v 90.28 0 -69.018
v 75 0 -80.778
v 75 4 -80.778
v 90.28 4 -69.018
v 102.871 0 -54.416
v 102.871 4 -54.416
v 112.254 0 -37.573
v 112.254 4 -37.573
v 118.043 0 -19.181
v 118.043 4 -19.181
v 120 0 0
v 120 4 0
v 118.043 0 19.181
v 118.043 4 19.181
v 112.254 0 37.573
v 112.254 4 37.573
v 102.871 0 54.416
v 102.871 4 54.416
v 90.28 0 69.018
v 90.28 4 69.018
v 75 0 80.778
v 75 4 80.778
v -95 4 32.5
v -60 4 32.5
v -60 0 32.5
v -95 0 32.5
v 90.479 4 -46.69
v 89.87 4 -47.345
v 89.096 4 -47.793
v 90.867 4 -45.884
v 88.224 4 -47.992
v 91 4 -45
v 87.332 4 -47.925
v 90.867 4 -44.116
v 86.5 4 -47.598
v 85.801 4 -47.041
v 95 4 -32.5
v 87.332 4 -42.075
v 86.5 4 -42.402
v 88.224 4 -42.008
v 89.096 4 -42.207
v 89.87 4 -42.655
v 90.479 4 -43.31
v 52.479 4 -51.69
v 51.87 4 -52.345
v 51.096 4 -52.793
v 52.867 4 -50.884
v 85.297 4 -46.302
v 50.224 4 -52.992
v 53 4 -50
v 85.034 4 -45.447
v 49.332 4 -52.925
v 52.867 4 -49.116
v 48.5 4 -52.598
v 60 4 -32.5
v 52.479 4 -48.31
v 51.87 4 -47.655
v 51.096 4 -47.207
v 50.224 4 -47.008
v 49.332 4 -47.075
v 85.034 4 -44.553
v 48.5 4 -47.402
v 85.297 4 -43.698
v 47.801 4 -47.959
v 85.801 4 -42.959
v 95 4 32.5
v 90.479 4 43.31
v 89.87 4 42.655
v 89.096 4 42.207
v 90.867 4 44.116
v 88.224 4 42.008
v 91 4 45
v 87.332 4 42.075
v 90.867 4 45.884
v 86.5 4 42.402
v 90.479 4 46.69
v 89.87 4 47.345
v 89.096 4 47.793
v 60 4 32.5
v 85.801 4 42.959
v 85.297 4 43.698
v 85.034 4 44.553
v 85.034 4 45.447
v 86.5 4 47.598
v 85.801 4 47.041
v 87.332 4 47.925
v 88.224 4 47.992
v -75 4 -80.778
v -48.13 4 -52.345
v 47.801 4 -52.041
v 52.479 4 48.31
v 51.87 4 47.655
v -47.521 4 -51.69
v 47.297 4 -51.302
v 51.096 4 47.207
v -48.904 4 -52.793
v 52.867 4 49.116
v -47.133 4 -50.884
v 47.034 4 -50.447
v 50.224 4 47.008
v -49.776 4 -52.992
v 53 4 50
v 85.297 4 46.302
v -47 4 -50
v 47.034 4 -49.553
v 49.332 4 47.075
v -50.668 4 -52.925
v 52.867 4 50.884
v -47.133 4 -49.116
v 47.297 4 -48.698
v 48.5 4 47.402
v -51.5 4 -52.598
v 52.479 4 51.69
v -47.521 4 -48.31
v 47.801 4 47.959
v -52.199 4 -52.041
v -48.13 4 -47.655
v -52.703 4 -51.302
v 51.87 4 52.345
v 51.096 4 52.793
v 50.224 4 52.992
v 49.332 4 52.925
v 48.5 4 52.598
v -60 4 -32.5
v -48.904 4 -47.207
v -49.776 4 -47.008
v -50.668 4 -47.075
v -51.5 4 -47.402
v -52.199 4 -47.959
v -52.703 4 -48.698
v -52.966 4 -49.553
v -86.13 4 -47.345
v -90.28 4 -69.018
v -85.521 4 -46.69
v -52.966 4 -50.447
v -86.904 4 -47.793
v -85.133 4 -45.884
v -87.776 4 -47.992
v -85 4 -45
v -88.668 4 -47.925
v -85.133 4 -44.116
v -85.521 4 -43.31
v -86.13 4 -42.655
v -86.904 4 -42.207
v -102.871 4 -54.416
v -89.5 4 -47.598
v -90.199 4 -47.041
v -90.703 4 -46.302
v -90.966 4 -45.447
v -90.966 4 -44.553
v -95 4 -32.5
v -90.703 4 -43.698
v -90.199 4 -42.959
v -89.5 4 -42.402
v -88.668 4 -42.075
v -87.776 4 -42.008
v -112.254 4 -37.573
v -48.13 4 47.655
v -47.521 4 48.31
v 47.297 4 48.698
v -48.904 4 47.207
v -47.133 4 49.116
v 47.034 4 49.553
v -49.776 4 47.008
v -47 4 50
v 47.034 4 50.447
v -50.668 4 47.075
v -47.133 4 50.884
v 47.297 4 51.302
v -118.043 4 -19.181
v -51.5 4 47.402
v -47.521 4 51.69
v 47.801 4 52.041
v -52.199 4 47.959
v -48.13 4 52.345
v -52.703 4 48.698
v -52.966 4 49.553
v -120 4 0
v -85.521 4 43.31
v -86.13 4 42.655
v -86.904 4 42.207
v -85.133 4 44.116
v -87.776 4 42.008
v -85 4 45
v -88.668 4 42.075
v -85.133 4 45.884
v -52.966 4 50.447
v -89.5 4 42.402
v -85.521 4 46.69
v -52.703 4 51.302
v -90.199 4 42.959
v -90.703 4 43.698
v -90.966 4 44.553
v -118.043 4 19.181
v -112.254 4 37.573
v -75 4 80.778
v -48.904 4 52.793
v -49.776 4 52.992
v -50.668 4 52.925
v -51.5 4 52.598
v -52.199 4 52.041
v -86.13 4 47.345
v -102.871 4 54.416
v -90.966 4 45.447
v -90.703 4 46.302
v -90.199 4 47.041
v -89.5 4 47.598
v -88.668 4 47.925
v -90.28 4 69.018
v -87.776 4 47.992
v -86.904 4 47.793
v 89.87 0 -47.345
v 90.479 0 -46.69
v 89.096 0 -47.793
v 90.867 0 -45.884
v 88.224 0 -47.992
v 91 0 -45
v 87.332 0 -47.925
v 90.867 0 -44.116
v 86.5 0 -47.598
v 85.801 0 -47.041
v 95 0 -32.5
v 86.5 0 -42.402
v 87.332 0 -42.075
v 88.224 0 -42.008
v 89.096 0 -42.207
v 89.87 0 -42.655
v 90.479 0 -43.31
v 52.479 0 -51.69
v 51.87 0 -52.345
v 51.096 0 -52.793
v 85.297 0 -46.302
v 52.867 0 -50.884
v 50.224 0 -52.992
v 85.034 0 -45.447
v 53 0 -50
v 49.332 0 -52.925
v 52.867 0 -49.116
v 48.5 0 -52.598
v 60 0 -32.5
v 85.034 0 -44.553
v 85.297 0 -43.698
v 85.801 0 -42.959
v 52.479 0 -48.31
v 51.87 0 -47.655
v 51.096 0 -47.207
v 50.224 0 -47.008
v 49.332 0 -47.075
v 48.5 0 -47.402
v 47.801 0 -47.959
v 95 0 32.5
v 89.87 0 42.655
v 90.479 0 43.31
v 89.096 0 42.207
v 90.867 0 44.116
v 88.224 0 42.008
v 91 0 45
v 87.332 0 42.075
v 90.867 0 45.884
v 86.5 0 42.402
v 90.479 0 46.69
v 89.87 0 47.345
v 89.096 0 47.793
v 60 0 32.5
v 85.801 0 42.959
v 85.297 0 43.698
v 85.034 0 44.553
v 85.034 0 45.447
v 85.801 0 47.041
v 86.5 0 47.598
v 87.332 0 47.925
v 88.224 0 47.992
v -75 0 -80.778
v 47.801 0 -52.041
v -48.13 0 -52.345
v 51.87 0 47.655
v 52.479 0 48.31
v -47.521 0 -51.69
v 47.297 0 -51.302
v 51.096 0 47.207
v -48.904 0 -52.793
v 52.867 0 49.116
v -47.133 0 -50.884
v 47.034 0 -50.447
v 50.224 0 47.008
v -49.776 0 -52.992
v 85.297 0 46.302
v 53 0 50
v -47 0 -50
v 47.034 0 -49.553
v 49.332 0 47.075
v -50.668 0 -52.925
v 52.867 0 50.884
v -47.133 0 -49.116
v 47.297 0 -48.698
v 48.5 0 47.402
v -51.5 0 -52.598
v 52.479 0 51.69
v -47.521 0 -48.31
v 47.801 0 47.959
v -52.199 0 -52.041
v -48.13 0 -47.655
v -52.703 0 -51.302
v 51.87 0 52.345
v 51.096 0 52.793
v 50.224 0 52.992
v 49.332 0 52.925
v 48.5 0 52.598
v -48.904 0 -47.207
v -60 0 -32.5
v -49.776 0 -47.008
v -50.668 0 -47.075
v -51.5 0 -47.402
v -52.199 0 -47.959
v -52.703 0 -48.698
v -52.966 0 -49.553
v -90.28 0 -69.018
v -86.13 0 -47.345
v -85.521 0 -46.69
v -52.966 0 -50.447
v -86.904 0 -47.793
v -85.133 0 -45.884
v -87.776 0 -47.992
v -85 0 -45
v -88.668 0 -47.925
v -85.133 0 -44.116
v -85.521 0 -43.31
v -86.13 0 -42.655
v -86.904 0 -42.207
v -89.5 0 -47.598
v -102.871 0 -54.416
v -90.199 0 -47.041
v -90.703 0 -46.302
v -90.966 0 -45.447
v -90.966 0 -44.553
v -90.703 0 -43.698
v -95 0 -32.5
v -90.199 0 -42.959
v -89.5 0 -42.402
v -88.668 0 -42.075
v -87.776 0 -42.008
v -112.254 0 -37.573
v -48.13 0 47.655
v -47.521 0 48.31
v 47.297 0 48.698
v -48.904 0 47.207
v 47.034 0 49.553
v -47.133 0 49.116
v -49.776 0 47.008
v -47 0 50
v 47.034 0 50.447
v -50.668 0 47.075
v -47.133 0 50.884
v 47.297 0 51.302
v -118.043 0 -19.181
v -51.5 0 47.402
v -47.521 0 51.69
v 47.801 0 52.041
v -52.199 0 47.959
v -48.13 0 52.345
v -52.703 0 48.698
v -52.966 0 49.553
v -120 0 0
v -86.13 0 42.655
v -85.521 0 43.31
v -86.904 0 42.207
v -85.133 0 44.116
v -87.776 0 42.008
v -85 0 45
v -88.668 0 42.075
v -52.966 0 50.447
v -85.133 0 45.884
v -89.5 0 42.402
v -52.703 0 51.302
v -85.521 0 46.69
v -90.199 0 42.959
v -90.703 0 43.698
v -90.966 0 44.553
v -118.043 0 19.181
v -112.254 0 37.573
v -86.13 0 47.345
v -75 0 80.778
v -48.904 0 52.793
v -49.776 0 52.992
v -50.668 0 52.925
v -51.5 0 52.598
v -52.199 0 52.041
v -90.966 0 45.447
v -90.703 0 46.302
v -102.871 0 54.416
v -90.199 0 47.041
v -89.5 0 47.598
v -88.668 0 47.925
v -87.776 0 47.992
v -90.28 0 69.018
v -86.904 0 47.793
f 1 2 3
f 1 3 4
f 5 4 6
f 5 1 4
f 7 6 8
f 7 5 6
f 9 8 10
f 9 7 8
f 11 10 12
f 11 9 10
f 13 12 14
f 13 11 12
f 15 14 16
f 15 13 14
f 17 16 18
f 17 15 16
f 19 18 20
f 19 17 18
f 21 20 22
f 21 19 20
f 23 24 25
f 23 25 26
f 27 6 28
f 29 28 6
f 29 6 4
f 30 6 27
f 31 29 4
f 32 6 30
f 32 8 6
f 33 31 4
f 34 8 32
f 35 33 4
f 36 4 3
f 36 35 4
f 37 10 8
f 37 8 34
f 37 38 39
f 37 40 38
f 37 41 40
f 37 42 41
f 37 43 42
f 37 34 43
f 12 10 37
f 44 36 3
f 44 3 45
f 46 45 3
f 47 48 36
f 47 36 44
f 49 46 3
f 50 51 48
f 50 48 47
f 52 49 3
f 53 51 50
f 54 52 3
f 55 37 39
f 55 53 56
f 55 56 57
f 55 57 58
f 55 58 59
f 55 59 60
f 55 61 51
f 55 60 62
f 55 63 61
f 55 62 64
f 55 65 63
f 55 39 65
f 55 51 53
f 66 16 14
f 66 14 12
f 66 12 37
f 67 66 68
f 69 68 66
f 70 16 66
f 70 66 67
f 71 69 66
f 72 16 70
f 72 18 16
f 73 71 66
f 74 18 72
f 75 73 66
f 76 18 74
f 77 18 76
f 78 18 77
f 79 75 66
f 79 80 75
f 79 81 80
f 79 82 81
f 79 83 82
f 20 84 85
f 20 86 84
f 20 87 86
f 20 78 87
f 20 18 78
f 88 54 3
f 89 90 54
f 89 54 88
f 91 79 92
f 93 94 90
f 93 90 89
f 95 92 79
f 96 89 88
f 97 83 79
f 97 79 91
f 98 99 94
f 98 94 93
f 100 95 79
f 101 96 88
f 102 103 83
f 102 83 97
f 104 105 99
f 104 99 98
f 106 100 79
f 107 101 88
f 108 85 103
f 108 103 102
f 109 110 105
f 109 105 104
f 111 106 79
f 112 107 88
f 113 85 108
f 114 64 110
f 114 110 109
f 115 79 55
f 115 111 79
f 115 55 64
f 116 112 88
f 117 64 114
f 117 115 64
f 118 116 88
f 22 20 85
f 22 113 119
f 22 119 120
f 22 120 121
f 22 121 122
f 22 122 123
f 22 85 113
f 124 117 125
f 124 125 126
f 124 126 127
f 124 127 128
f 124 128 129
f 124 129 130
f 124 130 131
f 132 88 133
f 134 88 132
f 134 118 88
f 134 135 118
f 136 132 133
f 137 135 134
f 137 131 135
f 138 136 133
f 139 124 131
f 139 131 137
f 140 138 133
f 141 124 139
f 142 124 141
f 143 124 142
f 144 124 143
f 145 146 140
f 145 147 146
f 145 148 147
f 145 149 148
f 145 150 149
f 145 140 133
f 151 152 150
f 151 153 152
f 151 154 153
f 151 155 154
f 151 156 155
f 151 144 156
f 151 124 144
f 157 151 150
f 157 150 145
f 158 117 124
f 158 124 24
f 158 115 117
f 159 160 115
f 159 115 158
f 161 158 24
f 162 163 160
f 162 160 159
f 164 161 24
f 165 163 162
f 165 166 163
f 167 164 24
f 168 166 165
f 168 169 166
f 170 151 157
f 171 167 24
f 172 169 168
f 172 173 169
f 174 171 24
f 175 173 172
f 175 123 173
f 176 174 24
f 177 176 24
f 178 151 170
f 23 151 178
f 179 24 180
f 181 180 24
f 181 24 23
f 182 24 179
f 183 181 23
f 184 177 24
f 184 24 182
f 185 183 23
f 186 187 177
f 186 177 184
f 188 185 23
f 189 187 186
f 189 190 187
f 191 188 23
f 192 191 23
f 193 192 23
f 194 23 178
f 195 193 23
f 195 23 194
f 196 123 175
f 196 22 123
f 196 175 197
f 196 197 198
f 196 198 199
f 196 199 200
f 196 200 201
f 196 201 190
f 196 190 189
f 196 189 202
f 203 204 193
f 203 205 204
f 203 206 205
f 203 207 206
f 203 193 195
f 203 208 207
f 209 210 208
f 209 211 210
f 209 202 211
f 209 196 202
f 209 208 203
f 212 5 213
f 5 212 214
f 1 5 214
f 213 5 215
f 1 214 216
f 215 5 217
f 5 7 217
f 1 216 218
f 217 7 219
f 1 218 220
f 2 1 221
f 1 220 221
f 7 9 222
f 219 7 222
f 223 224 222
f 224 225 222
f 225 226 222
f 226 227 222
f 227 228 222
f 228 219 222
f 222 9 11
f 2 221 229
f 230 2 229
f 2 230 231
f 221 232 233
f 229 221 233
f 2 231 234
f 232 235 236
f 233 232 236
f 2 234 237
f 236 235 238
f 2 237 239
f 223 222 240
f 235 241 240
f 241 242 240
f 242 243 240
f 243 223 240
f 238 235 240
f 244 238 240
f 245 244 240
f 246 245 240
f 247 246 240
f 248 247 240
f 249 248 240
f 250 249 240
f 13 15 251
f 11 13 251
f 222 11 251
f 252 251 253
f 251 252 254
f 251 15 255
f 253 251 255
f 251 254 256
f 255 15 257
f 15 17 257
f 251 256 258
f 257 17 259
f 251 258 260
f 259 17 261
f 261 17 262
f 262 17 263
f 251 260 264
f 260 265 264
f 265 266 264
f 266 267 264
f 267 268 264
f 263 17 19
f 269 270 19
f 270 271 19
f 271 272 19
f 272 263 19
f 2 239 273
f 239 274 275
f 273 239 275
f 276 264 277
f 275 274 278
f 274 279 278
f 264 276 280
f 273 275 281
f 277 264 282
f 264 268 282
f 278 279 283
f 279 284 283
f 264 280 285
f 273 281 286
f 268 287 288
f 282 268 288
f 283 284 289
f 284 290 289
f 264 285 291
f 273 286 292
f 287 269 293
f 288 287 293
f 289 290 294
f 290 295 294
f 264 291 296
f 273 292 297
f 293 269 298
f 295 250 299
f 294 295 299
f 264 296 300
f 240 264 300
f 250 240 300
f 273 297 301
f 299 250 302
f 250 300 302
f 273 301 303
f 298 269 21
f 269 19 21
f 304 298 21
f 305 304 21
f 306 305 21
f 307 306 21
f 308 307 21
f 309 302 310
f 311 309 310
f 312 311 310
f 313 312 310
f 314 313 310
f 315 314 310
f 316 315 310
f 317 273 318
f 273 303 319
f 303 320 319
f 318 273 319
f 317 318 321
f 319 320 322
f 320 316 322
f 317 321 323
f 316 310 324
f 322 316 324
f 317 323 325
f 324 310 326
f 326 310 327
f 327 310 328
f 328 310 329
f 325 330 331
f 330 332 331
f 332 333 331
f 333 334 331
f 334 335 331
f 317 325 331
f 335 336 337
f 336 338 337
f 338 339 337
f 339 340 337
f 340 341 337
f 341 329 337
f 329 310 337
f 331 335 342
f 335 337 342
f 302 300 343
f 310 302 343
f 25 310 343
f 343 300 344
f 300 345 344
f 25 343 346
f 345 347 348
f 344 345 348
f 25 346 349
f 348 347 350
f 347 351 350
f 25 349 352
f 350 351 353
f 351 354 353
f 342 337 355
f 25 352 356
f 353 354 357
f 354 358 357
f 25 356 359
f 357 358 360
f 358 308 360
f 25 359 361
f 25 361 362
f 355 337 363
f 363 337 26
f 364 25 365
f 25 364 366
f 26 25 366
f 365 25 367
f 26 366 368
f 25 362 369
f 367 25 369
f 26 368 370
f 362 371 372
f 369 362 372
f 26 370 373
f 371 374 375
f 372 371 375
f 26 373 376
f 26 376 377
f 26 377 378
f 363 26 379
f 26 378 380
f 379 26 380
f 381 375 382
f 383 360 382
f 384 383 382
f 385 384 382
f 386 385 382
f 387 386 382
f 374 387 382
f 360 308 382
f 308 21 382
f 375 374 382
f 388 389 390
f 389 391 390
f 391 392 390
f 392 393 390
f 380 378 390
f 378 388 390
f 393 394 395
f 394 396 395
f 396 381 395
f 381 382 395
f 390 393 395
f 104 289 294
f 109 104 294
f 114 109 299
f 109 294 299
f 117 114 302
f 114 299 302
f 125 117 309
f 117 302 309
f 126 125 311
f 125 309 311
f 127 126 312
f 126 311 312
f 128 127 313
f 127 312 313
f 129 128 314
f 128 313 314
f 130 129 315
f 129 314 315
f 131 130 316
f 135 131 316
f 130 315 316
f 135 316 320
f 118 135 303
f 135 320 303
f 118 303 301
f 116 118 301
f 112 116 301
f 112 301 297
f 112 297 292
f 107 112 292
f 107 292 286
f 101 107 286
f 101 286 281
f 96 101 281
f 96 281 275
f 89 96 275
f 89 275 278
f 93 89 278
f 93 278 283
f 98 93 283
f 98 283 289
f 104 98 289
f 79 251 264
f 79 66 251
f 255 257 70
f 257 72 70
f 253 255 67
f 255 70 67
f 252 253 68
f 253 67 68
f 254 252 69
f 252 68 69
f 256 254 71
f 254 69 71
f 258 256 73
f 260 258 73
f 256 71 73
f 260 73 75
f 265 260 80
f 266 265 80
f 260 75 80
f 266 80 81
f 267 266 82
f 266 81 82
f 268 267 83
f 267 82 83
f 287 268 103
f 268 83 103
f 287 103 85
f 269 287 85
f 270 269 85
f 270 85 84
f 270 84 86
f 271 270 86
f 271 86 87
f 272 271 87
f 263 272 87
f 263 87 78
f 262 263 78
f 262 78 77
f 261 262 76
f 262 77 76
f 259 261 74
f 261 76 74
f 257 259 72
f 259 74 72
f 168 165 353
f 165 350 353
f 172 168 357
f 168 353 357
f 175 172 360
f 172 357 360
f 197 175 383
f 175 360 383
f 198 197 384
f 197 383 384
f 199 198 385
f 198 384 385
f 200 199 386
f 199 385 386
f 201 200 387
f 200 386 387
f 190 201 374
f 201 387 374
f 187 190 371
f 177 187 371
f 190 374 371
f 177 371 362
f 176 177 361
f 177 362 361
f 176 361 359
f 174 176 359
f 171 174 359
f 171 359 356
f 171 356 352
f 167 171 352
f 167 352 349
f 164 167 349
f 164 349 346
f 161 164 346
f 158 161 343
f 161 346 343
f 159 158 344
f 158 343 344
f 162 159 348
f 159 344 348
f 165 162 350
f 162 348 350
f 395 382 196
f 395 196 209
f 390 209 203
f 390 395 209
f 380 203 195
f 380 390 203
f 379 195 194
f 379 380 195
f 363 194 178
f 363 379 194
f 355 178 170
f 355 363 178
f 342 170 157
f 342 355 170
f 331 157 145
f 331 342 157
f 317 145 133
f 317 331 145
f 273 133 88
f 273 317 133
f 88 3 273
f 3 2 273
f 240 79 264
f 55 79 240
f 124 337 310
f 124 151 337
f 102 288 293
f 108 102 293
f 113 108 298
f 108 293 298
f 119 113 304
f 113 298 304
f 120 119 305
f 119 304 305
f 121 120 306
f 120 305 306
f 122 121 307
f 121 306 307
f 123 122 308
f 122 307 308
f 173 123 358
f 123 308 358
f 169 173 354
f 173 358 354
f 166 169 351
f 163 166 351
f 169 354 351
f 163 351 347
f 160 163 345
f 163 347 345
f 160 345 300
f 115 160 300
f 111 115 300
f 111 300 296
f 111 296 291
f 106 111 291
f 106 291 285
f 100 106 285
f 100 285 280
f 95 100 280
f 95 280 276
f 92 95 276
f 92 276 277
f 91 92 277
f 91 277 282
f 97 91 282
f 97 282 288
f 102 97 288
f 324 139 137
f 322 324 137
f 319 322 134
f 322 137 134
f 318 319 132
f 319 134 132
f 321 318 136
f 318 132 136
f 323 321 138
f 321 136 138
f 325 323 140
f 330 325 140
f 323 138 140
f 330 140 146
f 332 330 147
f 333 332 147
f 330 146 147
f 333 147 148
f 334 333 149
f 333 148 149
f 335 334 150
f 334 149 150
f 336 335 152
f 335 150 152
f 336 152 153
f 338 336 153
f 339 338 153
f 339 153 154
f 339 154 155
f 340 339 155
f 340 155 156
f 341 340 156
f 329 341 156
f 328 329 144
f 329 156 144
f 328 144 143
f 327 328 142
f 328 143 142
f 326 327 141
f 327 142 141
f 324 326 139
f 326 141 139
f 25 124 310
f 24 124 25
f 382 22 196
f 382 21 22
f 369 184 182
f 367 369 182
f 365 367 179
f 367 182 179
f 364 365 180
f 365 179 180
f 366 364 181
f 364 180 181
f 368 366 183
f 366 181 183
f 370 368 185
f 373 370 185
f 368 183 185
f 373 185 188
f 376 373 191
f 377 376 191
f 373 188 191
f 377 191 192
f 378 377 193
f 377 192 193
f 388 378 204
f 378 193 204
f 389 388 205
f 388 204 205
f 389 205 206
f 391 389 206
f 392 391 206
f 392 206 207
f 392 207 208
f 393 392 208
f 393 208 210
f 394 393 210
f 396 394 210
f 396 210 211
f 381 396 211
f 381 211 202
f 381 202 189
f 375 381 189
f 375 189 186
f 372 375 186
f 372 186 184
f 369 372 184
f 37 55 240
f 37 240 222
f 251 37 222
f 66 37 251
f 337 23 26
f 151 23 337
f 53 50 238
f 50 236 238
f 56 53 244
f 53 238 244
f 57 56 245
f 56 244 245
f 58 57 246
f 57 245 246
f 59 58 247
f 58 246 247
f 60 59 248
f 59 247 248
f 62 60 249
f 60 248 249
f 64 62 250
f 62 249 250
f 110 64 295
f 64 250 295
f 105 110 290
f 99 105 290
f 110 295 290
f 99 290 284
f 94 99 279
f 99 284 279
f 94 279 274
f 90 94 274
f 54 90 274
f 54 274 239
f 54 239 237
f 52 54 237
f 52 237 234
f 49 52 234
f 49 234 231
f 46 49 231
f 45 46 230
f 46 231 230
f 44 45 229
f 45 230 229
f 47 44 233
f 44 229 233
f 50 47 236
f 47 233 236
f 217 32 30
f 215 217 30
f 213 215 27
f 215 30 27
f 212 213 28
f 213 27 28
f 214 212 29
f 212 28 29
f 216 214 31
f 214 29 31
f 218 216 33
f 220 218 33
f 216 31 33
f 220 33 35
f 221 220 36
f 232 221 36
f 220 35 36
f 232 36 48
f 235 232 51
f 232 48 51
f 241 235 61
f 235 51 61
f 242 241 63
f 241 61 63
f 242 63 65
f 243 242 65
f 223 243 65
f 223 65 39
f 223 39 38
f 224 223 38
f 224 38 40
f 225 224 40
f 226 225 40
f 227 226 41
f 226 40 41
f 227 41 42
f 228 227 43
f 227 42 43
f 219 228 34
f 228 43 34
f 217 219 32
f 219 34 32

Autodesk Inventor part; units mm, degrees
ref_plane "YZ Plane" through (0, 0, 0) normal (1, 0, 0) x (0, 1, 0)
ref_plane "XZ Plane" through (0, 0, 0) normal (0, 1, 0) x (-1, 0, 0)
ref_plane "XY Plane" through (0, 0, 0) normal (0, 0, 1) x (1, 0, 0)
sketch "Esquisse1" plane through (0, 0, 0) normal (0, 1, 0) x (-1, 0, 0)
  circle A0 centre (0, 0) radius 25 construction
  line L0 (-25, 0) -> (25, 0) construction
  arc A1 (-75, -80.7775) -> (-75, 80.7775) centre (-25, 0) ccw construction
  arc A2 (75, 80.7775) -> (75, -80.7775) centre (25, 0) ccw construction
  line L1 (0, 25) -> (0, 0) construction
  line L2 (-75, 80.7775) -> (75, 80.7775)
  line L3 (-75, -80.7775) -> (75, -80.7775)
  arc A3 (75, -80.7775) -> (75, 80.7775) centre (25, 0) ccw
  arc A4 (-75, 80.7775) -> (-75, -80.7775) centre (-25, 0) ccw
  dimension "d0" = 50
  dimension "d1" = 190
  dimension "d2" = 150
extrude "Extrusion1" add sketch "Esquisse1" along normal blind 4
sketch "Esquisse2" plane through (0, 4, 0) normal (0, 1, 0) x (1, 0, 0)
  line L0 (75, 80.7775) -> (-75, 80.7775) projected
  arc A0 (-75, 80.7775) -> (-75, -80.7775) centre (-25, 0) ccw projected
  line L1 (-95, 32.5) -> (-60, 32.5)
  line L2 (-60, 32.5) -> (-60, -32.5)
  line L3 (-60, -32.5) -> (-95, -32.5)
  line L4 (-95, -32.5) -> (-95, 32.5)
  line L5 (60, 32.5) -> (95, 32.5)
  line L6 (95, 32.5) -> (95, -32.5)
  line L7 (95, -32.5) -> (60, -32.5)
  line L8 (60, -32.5) -> (60, 32.5)
  line L9 (0, 0) -> (0, 80.7775) construction
  line L10 (0, 0) -> (-120, 0) construction
  dimension "d5" = 35
  dimension "d6" = 60
  dimension "d7" = 65
extrude "Extrusion2" cut sketch "Esquisse2" against normal through all
sketch "Esquisse3" plane through (0, 4, 0) normal (0, 1, 0) x (1, 0, 0)
  line L0 (75, 80.7775) -> (-75, 80.7775) projected
  circle A0 centre (-88, 45) radius 3
  circle A1 centre (-88, -45) radius 3
  line L1 (-88, -45) -> (-88, 45) construction
  line L2 (0, 0) -> (-88, 0) construction
  line L3 (0, 0) -> (0, 80.7775) construction
  circle A2 centre (88, 45) radius 3
  circle A3 centre (88, -45) radius 3
  dimension "d10" = 88
  dimension "d11" = 6
  dimension "d12" = 90
extrude "Extrusion3" cut sketch "Esquisse3" against normal through all
sketch "Esquisse4" plane through (0, 0, 0) normal (0, -1, 0) x (1, 0, 0)
  line L0 (-50, 50) -> (50, 50) construction
  line L1 (50, 50) -> (50, -50) construction
  line L2 (50, -50) -> (-50, -50) construction
  line L3 (-50, -50) -> (-50, 50) construction
  circle A0 centre (-50, 50) radius 3
  circle A1 centre (50, 50) radius 3
  circle A2 centre (50, -50) radius 3
  circle A3 centre (-50, -50) radius 3
  line L4 (75, 80.7775) -> (-75, 80.7775) projected
  point P0 (0, 0)
  dimension "d15" = 100
  dimension "d16" = 100
  dimension "d17" = 50
  dimension "d18" = 50
  dimension "d19" = 6
  dimension "d20" = 6
  dimension "d21" = 6
  dimension "d22" = 6
  dimension "d25" = 30.7775
extrude "Extrusion4" cut sketch "Esquisse4" against normal through all
equation "\"d17\" = 0.5 * d16"
equation "\"d18\" = 0.5 * d15"
equation "\"d20\" = d19"
equation "\"d21\" = d19"
equation "\"d22\" = d19"
properties part number "base"
